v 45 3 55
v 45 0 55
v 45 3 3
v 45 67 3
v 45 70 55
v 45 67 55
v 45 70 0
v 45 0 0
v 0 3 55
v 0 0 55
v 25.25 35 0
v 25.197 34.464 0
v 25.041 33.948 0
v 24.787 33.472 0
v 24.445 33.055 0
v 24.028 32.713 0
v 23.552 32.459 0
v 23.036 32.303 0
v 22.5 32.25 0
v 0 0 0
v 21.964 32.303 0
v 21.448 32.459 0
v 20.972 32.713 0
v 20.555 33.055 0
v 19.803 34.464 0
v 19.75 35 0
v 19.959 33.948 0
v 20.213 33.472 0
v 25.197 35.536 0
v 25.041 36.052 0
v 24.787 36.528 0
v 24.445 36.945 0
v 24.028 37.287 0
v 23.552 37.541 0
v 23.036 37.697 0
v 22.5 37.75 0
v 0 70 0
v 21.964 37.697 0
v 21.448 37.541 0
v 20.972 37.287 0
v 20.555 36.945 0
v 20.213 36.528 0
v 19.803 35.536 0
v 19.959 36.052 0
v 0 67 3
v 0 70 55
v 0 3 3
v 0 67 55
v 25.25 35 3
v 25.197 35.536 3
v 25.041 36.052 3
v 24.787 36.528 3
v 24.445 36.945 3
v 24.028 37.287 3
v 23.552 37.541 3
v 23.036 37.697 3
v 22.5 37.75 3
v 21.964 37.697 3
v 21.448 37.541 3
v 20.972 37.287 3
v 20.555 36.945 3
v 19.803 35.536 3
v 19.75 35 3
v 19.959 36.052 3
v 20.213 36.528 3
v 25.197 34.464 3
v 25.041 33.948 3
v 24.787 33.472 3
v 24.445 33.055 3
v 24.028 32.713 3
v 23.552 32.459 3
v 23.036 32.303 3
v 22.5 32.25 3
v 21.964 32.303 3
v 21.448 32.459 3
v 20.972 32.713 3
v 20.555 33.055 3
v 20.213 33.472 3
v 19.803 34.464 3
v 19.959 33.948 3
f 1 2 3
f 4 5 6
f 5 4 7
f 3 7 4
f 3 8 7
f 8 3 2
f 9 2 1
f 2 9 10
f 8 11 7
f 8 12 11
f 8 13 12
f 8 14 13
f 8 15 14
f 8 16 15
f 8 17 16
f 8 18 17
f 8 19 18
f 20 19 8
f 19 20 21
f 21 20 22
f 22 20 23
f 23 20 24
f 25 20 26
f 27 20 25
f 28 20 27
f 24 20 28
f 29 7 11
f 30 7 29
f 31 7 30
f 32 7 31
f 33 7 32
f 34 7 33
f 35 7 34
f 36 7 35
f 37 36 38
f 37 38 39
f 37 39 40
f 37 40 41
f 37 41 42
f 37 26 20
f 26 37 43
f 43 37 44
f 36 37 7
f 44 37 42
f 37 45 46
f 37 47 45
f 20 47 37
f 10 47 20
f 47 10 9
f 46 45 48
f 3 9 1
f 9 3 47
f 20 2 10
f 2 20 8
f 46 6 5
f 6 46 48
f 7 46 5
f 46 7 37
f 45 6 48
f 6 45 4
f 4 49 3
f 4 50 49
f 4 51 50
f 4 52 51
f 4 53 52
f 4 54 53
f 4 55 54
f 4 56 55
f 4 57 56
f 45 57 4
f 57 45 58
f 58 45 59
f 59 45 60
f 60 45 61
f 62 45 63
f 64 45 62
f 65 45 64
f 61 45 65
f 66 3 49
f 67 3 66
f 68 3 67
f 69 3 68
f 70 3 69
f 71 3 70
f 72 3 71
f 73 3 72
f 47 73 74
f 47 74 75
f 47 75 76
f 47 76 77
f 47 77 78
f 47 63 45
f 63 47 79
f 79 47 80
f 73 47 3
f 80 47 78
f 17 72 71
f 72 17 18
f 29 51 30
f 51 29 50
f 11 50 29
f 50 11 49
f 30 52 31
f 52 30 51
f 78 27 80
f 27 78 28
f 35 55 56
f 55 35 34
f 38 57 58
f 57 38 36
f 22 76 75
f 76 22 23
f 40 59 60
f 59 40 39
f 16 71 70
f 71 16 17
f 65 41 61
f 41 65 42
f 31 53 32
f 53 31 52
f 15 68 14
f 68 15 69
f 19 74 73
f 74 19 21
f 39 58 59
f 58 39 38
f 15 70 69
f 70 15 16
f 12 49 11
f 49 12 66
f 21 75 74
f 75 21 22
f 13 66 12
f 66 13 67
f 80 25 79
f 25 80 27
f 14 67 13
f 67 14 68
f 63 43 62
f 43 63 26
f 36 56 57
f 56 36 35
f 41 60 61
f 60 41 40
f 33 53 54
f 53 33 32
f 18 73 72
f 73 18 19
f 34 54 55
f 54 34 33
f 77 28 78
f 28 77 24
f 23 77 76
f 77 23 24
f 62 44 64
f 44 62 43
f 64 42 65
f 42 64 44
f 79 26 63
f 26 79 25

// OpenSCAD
$fn = 32;
// ----------------------------------------------------------------------
// U-bracket: 45 x 70 x 55 mm
// ----------------------------------------------------------------------

// --- parameters (mm) ---
rail_len = 45;            // outer length, X
jaw_w = 70;               // outer width, Y
jaw_h = 55;               // upright height, Z
web_t = 3;                // wall thickness
hole_d = 5.5;             // clearance for M5

module hole_z(px, py) {
  translate([px, py, -2.5]) cylinder(h = web_t + 5, d = hole_d);
}
module hole_y_pz(pz) {
  /* through both uprights along Y */
  translate([0, -2.5, pz]) rotate([-90, 0, 0]) cylinder(h = jaw_w + 5, d = hole_d);
}

module base() {
  cube([rail_len, jaw_w, web_t]);
}

module uprights() {
  cube([rail_len, web_t, jaw_h]);
  translate([0, jaw_w - web_t, 0]) cube([rail_len, web_t, jaw_h]);
}

difference() {
  union() {
    base();
    uprights();
  }
  hole_z(22.5, 35);
}
